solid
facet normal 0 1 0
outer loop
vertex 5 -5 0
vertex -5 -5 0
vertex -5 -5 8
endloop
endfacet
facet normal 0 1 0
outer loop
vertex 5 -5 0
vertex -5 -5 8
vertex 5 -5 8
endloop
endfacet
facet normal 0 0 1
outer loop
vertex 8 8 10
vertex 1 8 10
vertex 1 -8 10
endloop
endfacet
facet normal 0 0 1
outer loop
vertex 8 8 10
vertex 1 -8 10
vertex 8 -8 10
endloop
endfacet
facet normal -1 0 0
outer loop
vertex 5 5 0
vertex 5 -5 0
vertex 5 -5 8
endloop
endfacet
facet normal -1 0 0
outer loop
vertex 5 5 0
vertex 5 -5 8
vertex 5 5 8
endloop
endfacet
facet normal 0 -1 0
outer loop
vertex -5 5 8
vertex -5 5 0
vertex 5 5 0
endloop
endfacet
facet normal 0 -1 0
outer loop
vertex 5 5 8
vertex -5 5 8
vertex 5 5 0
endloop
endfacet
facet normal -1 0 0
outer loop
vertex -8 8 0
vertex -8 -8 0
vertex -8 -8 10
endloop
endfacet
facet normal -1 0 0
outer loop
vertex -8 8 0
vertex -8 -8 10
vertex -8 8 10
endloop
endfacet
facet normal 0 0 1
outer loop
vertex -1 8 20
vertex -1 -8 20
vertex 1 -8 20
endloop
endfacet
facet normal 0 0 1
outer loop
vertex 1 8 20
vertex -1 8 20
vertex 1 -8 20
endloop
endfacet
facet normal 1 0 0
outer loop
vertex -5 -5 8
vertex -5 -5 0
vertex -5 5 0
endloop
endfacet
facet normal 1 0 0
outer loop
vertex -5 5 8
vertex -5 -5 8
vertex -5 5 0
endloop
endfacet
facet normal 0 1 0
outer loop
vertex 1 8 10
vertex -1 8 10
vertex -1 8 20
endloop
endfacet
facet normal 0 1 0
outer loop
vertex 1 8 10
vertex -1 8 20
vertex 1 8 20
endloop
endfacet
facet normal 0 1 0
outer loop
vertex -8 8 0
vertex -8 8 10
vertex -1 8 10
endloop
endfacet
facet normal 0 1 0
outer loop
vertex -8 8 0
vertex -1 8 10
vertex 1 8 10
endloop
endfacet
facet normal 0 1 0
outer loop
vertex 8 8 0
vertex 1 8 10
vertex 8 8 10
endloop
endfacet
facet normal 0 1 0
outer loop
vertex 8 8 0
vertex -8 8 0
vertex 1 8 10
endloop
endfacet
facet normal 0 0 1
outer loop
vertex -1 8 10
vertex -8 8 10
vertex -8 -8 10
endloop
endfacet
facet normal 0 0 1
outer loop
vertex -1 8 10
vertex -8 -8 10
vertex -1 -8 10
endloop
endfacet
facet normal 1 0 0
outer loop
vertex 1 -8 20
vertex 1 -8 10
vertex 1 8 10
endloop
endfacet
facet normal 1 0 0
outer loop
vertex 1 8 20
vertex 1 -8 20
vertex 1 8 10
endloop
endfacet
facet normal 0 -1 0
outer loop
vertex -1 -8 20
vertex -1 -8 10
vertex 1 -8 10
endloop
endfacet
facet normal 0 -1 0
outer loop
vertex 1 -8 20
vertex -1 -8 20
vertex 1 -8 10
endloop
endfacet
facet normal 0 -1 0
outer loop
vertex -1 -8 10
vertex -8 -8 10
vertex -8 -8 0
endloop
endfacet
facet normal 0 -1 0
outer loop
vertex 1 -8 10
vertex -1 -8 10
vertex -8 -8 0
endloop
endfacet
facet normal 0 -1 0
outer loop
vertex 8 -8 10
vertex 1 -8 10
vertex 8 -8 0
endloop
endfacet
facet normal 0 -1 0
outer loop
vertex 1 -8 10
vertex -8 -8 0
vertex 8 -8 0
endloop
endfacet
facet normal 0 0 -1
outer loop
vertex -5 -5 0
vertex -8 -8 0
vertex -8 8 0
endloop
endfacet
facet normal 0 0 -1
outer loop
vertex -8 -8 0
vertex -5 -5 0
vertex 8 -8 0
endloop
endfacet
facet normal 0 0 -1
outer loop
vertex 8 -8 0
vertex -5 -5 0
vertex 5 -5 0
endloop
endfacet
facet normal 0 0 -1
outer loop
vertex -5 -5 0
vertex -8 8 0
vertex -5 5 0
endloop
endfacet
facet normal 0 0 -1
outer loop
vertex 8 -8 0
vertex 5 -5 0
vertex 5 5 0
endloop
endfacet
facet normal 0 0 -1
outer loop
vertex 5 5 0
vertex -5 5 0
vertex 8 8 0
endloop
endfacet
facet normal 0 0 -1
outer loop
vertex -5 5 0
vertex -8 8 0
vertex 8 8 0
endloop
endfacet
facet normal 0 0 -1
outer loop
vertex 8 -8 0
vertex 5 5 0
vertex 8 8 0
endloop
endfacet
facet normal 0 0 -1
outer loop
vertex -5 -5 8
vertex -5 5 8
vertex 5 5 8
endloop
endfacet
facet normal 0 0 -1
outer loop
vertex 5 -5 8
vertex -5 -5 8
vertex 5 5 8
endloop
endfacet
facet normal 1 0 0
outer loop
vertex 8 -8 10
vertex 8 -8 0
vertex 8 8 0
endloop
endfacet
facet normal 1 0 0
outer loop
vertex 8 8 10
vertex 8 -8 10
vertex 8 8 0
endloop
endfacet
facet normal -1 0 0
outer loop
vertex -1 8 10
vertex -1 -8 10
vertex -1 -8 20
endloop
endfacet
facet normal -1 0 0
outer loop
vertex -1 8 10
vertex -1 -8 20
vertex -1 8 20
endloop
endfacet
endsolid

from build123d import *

# Parameters (mm, degrees)
BOX002_W     = 10
BOX002_H     = 10
BOX002_DEPTH = 8
BOX001_W     = 2
BOX001_H     = 16
BOX001_DEPTH = 10
BOX_W        = 16
BOX_H        = 16
BOX_DEPTH    = 10


with BuildPart() as cube002:
    # Box002 → Box002 (new body)
    with BuildSketch(Plane(origin=(-5, -5, 0), x_dir=(1, 0, 0), z_dir=(0, 0, 1))):
        with Locations((5, 5)):
            Rectangle(BOX002_W, BOX002_H)
    extrude(amount=BOX002_DEPTH)


with BuildPart() as cube001:
    # Box001 → Box001 (new body)
    with BuildSketch(Plane(origin=(-1, -8, 10), x_dir=(1, 0, 0), z_dir=(0, 0, 1))):
        with Locations((1, 8)):
            Rectangle(BOX001_W, BOX001_H)
    extrude(amount=BOX001_DEPTH)


with BuildPart() as cut:
    # Box → Box (new body)
    with BuildSketch(Plane(origin=(-8, -8, 0), x_dir=(1, 0, 0), z_dir=(0, 0, 1))):
        with Locations((8, 8)):
            Rectangle(BOX_W, BOX_H)
    extrude(amount=BOX_DEPTH)

    # Fusion: union Cube001
    add(cube001.part)

    # Cut: cut Cube002
    add(cube002.part, mode=Mode.SUBTRACT)


solid = cut.part
